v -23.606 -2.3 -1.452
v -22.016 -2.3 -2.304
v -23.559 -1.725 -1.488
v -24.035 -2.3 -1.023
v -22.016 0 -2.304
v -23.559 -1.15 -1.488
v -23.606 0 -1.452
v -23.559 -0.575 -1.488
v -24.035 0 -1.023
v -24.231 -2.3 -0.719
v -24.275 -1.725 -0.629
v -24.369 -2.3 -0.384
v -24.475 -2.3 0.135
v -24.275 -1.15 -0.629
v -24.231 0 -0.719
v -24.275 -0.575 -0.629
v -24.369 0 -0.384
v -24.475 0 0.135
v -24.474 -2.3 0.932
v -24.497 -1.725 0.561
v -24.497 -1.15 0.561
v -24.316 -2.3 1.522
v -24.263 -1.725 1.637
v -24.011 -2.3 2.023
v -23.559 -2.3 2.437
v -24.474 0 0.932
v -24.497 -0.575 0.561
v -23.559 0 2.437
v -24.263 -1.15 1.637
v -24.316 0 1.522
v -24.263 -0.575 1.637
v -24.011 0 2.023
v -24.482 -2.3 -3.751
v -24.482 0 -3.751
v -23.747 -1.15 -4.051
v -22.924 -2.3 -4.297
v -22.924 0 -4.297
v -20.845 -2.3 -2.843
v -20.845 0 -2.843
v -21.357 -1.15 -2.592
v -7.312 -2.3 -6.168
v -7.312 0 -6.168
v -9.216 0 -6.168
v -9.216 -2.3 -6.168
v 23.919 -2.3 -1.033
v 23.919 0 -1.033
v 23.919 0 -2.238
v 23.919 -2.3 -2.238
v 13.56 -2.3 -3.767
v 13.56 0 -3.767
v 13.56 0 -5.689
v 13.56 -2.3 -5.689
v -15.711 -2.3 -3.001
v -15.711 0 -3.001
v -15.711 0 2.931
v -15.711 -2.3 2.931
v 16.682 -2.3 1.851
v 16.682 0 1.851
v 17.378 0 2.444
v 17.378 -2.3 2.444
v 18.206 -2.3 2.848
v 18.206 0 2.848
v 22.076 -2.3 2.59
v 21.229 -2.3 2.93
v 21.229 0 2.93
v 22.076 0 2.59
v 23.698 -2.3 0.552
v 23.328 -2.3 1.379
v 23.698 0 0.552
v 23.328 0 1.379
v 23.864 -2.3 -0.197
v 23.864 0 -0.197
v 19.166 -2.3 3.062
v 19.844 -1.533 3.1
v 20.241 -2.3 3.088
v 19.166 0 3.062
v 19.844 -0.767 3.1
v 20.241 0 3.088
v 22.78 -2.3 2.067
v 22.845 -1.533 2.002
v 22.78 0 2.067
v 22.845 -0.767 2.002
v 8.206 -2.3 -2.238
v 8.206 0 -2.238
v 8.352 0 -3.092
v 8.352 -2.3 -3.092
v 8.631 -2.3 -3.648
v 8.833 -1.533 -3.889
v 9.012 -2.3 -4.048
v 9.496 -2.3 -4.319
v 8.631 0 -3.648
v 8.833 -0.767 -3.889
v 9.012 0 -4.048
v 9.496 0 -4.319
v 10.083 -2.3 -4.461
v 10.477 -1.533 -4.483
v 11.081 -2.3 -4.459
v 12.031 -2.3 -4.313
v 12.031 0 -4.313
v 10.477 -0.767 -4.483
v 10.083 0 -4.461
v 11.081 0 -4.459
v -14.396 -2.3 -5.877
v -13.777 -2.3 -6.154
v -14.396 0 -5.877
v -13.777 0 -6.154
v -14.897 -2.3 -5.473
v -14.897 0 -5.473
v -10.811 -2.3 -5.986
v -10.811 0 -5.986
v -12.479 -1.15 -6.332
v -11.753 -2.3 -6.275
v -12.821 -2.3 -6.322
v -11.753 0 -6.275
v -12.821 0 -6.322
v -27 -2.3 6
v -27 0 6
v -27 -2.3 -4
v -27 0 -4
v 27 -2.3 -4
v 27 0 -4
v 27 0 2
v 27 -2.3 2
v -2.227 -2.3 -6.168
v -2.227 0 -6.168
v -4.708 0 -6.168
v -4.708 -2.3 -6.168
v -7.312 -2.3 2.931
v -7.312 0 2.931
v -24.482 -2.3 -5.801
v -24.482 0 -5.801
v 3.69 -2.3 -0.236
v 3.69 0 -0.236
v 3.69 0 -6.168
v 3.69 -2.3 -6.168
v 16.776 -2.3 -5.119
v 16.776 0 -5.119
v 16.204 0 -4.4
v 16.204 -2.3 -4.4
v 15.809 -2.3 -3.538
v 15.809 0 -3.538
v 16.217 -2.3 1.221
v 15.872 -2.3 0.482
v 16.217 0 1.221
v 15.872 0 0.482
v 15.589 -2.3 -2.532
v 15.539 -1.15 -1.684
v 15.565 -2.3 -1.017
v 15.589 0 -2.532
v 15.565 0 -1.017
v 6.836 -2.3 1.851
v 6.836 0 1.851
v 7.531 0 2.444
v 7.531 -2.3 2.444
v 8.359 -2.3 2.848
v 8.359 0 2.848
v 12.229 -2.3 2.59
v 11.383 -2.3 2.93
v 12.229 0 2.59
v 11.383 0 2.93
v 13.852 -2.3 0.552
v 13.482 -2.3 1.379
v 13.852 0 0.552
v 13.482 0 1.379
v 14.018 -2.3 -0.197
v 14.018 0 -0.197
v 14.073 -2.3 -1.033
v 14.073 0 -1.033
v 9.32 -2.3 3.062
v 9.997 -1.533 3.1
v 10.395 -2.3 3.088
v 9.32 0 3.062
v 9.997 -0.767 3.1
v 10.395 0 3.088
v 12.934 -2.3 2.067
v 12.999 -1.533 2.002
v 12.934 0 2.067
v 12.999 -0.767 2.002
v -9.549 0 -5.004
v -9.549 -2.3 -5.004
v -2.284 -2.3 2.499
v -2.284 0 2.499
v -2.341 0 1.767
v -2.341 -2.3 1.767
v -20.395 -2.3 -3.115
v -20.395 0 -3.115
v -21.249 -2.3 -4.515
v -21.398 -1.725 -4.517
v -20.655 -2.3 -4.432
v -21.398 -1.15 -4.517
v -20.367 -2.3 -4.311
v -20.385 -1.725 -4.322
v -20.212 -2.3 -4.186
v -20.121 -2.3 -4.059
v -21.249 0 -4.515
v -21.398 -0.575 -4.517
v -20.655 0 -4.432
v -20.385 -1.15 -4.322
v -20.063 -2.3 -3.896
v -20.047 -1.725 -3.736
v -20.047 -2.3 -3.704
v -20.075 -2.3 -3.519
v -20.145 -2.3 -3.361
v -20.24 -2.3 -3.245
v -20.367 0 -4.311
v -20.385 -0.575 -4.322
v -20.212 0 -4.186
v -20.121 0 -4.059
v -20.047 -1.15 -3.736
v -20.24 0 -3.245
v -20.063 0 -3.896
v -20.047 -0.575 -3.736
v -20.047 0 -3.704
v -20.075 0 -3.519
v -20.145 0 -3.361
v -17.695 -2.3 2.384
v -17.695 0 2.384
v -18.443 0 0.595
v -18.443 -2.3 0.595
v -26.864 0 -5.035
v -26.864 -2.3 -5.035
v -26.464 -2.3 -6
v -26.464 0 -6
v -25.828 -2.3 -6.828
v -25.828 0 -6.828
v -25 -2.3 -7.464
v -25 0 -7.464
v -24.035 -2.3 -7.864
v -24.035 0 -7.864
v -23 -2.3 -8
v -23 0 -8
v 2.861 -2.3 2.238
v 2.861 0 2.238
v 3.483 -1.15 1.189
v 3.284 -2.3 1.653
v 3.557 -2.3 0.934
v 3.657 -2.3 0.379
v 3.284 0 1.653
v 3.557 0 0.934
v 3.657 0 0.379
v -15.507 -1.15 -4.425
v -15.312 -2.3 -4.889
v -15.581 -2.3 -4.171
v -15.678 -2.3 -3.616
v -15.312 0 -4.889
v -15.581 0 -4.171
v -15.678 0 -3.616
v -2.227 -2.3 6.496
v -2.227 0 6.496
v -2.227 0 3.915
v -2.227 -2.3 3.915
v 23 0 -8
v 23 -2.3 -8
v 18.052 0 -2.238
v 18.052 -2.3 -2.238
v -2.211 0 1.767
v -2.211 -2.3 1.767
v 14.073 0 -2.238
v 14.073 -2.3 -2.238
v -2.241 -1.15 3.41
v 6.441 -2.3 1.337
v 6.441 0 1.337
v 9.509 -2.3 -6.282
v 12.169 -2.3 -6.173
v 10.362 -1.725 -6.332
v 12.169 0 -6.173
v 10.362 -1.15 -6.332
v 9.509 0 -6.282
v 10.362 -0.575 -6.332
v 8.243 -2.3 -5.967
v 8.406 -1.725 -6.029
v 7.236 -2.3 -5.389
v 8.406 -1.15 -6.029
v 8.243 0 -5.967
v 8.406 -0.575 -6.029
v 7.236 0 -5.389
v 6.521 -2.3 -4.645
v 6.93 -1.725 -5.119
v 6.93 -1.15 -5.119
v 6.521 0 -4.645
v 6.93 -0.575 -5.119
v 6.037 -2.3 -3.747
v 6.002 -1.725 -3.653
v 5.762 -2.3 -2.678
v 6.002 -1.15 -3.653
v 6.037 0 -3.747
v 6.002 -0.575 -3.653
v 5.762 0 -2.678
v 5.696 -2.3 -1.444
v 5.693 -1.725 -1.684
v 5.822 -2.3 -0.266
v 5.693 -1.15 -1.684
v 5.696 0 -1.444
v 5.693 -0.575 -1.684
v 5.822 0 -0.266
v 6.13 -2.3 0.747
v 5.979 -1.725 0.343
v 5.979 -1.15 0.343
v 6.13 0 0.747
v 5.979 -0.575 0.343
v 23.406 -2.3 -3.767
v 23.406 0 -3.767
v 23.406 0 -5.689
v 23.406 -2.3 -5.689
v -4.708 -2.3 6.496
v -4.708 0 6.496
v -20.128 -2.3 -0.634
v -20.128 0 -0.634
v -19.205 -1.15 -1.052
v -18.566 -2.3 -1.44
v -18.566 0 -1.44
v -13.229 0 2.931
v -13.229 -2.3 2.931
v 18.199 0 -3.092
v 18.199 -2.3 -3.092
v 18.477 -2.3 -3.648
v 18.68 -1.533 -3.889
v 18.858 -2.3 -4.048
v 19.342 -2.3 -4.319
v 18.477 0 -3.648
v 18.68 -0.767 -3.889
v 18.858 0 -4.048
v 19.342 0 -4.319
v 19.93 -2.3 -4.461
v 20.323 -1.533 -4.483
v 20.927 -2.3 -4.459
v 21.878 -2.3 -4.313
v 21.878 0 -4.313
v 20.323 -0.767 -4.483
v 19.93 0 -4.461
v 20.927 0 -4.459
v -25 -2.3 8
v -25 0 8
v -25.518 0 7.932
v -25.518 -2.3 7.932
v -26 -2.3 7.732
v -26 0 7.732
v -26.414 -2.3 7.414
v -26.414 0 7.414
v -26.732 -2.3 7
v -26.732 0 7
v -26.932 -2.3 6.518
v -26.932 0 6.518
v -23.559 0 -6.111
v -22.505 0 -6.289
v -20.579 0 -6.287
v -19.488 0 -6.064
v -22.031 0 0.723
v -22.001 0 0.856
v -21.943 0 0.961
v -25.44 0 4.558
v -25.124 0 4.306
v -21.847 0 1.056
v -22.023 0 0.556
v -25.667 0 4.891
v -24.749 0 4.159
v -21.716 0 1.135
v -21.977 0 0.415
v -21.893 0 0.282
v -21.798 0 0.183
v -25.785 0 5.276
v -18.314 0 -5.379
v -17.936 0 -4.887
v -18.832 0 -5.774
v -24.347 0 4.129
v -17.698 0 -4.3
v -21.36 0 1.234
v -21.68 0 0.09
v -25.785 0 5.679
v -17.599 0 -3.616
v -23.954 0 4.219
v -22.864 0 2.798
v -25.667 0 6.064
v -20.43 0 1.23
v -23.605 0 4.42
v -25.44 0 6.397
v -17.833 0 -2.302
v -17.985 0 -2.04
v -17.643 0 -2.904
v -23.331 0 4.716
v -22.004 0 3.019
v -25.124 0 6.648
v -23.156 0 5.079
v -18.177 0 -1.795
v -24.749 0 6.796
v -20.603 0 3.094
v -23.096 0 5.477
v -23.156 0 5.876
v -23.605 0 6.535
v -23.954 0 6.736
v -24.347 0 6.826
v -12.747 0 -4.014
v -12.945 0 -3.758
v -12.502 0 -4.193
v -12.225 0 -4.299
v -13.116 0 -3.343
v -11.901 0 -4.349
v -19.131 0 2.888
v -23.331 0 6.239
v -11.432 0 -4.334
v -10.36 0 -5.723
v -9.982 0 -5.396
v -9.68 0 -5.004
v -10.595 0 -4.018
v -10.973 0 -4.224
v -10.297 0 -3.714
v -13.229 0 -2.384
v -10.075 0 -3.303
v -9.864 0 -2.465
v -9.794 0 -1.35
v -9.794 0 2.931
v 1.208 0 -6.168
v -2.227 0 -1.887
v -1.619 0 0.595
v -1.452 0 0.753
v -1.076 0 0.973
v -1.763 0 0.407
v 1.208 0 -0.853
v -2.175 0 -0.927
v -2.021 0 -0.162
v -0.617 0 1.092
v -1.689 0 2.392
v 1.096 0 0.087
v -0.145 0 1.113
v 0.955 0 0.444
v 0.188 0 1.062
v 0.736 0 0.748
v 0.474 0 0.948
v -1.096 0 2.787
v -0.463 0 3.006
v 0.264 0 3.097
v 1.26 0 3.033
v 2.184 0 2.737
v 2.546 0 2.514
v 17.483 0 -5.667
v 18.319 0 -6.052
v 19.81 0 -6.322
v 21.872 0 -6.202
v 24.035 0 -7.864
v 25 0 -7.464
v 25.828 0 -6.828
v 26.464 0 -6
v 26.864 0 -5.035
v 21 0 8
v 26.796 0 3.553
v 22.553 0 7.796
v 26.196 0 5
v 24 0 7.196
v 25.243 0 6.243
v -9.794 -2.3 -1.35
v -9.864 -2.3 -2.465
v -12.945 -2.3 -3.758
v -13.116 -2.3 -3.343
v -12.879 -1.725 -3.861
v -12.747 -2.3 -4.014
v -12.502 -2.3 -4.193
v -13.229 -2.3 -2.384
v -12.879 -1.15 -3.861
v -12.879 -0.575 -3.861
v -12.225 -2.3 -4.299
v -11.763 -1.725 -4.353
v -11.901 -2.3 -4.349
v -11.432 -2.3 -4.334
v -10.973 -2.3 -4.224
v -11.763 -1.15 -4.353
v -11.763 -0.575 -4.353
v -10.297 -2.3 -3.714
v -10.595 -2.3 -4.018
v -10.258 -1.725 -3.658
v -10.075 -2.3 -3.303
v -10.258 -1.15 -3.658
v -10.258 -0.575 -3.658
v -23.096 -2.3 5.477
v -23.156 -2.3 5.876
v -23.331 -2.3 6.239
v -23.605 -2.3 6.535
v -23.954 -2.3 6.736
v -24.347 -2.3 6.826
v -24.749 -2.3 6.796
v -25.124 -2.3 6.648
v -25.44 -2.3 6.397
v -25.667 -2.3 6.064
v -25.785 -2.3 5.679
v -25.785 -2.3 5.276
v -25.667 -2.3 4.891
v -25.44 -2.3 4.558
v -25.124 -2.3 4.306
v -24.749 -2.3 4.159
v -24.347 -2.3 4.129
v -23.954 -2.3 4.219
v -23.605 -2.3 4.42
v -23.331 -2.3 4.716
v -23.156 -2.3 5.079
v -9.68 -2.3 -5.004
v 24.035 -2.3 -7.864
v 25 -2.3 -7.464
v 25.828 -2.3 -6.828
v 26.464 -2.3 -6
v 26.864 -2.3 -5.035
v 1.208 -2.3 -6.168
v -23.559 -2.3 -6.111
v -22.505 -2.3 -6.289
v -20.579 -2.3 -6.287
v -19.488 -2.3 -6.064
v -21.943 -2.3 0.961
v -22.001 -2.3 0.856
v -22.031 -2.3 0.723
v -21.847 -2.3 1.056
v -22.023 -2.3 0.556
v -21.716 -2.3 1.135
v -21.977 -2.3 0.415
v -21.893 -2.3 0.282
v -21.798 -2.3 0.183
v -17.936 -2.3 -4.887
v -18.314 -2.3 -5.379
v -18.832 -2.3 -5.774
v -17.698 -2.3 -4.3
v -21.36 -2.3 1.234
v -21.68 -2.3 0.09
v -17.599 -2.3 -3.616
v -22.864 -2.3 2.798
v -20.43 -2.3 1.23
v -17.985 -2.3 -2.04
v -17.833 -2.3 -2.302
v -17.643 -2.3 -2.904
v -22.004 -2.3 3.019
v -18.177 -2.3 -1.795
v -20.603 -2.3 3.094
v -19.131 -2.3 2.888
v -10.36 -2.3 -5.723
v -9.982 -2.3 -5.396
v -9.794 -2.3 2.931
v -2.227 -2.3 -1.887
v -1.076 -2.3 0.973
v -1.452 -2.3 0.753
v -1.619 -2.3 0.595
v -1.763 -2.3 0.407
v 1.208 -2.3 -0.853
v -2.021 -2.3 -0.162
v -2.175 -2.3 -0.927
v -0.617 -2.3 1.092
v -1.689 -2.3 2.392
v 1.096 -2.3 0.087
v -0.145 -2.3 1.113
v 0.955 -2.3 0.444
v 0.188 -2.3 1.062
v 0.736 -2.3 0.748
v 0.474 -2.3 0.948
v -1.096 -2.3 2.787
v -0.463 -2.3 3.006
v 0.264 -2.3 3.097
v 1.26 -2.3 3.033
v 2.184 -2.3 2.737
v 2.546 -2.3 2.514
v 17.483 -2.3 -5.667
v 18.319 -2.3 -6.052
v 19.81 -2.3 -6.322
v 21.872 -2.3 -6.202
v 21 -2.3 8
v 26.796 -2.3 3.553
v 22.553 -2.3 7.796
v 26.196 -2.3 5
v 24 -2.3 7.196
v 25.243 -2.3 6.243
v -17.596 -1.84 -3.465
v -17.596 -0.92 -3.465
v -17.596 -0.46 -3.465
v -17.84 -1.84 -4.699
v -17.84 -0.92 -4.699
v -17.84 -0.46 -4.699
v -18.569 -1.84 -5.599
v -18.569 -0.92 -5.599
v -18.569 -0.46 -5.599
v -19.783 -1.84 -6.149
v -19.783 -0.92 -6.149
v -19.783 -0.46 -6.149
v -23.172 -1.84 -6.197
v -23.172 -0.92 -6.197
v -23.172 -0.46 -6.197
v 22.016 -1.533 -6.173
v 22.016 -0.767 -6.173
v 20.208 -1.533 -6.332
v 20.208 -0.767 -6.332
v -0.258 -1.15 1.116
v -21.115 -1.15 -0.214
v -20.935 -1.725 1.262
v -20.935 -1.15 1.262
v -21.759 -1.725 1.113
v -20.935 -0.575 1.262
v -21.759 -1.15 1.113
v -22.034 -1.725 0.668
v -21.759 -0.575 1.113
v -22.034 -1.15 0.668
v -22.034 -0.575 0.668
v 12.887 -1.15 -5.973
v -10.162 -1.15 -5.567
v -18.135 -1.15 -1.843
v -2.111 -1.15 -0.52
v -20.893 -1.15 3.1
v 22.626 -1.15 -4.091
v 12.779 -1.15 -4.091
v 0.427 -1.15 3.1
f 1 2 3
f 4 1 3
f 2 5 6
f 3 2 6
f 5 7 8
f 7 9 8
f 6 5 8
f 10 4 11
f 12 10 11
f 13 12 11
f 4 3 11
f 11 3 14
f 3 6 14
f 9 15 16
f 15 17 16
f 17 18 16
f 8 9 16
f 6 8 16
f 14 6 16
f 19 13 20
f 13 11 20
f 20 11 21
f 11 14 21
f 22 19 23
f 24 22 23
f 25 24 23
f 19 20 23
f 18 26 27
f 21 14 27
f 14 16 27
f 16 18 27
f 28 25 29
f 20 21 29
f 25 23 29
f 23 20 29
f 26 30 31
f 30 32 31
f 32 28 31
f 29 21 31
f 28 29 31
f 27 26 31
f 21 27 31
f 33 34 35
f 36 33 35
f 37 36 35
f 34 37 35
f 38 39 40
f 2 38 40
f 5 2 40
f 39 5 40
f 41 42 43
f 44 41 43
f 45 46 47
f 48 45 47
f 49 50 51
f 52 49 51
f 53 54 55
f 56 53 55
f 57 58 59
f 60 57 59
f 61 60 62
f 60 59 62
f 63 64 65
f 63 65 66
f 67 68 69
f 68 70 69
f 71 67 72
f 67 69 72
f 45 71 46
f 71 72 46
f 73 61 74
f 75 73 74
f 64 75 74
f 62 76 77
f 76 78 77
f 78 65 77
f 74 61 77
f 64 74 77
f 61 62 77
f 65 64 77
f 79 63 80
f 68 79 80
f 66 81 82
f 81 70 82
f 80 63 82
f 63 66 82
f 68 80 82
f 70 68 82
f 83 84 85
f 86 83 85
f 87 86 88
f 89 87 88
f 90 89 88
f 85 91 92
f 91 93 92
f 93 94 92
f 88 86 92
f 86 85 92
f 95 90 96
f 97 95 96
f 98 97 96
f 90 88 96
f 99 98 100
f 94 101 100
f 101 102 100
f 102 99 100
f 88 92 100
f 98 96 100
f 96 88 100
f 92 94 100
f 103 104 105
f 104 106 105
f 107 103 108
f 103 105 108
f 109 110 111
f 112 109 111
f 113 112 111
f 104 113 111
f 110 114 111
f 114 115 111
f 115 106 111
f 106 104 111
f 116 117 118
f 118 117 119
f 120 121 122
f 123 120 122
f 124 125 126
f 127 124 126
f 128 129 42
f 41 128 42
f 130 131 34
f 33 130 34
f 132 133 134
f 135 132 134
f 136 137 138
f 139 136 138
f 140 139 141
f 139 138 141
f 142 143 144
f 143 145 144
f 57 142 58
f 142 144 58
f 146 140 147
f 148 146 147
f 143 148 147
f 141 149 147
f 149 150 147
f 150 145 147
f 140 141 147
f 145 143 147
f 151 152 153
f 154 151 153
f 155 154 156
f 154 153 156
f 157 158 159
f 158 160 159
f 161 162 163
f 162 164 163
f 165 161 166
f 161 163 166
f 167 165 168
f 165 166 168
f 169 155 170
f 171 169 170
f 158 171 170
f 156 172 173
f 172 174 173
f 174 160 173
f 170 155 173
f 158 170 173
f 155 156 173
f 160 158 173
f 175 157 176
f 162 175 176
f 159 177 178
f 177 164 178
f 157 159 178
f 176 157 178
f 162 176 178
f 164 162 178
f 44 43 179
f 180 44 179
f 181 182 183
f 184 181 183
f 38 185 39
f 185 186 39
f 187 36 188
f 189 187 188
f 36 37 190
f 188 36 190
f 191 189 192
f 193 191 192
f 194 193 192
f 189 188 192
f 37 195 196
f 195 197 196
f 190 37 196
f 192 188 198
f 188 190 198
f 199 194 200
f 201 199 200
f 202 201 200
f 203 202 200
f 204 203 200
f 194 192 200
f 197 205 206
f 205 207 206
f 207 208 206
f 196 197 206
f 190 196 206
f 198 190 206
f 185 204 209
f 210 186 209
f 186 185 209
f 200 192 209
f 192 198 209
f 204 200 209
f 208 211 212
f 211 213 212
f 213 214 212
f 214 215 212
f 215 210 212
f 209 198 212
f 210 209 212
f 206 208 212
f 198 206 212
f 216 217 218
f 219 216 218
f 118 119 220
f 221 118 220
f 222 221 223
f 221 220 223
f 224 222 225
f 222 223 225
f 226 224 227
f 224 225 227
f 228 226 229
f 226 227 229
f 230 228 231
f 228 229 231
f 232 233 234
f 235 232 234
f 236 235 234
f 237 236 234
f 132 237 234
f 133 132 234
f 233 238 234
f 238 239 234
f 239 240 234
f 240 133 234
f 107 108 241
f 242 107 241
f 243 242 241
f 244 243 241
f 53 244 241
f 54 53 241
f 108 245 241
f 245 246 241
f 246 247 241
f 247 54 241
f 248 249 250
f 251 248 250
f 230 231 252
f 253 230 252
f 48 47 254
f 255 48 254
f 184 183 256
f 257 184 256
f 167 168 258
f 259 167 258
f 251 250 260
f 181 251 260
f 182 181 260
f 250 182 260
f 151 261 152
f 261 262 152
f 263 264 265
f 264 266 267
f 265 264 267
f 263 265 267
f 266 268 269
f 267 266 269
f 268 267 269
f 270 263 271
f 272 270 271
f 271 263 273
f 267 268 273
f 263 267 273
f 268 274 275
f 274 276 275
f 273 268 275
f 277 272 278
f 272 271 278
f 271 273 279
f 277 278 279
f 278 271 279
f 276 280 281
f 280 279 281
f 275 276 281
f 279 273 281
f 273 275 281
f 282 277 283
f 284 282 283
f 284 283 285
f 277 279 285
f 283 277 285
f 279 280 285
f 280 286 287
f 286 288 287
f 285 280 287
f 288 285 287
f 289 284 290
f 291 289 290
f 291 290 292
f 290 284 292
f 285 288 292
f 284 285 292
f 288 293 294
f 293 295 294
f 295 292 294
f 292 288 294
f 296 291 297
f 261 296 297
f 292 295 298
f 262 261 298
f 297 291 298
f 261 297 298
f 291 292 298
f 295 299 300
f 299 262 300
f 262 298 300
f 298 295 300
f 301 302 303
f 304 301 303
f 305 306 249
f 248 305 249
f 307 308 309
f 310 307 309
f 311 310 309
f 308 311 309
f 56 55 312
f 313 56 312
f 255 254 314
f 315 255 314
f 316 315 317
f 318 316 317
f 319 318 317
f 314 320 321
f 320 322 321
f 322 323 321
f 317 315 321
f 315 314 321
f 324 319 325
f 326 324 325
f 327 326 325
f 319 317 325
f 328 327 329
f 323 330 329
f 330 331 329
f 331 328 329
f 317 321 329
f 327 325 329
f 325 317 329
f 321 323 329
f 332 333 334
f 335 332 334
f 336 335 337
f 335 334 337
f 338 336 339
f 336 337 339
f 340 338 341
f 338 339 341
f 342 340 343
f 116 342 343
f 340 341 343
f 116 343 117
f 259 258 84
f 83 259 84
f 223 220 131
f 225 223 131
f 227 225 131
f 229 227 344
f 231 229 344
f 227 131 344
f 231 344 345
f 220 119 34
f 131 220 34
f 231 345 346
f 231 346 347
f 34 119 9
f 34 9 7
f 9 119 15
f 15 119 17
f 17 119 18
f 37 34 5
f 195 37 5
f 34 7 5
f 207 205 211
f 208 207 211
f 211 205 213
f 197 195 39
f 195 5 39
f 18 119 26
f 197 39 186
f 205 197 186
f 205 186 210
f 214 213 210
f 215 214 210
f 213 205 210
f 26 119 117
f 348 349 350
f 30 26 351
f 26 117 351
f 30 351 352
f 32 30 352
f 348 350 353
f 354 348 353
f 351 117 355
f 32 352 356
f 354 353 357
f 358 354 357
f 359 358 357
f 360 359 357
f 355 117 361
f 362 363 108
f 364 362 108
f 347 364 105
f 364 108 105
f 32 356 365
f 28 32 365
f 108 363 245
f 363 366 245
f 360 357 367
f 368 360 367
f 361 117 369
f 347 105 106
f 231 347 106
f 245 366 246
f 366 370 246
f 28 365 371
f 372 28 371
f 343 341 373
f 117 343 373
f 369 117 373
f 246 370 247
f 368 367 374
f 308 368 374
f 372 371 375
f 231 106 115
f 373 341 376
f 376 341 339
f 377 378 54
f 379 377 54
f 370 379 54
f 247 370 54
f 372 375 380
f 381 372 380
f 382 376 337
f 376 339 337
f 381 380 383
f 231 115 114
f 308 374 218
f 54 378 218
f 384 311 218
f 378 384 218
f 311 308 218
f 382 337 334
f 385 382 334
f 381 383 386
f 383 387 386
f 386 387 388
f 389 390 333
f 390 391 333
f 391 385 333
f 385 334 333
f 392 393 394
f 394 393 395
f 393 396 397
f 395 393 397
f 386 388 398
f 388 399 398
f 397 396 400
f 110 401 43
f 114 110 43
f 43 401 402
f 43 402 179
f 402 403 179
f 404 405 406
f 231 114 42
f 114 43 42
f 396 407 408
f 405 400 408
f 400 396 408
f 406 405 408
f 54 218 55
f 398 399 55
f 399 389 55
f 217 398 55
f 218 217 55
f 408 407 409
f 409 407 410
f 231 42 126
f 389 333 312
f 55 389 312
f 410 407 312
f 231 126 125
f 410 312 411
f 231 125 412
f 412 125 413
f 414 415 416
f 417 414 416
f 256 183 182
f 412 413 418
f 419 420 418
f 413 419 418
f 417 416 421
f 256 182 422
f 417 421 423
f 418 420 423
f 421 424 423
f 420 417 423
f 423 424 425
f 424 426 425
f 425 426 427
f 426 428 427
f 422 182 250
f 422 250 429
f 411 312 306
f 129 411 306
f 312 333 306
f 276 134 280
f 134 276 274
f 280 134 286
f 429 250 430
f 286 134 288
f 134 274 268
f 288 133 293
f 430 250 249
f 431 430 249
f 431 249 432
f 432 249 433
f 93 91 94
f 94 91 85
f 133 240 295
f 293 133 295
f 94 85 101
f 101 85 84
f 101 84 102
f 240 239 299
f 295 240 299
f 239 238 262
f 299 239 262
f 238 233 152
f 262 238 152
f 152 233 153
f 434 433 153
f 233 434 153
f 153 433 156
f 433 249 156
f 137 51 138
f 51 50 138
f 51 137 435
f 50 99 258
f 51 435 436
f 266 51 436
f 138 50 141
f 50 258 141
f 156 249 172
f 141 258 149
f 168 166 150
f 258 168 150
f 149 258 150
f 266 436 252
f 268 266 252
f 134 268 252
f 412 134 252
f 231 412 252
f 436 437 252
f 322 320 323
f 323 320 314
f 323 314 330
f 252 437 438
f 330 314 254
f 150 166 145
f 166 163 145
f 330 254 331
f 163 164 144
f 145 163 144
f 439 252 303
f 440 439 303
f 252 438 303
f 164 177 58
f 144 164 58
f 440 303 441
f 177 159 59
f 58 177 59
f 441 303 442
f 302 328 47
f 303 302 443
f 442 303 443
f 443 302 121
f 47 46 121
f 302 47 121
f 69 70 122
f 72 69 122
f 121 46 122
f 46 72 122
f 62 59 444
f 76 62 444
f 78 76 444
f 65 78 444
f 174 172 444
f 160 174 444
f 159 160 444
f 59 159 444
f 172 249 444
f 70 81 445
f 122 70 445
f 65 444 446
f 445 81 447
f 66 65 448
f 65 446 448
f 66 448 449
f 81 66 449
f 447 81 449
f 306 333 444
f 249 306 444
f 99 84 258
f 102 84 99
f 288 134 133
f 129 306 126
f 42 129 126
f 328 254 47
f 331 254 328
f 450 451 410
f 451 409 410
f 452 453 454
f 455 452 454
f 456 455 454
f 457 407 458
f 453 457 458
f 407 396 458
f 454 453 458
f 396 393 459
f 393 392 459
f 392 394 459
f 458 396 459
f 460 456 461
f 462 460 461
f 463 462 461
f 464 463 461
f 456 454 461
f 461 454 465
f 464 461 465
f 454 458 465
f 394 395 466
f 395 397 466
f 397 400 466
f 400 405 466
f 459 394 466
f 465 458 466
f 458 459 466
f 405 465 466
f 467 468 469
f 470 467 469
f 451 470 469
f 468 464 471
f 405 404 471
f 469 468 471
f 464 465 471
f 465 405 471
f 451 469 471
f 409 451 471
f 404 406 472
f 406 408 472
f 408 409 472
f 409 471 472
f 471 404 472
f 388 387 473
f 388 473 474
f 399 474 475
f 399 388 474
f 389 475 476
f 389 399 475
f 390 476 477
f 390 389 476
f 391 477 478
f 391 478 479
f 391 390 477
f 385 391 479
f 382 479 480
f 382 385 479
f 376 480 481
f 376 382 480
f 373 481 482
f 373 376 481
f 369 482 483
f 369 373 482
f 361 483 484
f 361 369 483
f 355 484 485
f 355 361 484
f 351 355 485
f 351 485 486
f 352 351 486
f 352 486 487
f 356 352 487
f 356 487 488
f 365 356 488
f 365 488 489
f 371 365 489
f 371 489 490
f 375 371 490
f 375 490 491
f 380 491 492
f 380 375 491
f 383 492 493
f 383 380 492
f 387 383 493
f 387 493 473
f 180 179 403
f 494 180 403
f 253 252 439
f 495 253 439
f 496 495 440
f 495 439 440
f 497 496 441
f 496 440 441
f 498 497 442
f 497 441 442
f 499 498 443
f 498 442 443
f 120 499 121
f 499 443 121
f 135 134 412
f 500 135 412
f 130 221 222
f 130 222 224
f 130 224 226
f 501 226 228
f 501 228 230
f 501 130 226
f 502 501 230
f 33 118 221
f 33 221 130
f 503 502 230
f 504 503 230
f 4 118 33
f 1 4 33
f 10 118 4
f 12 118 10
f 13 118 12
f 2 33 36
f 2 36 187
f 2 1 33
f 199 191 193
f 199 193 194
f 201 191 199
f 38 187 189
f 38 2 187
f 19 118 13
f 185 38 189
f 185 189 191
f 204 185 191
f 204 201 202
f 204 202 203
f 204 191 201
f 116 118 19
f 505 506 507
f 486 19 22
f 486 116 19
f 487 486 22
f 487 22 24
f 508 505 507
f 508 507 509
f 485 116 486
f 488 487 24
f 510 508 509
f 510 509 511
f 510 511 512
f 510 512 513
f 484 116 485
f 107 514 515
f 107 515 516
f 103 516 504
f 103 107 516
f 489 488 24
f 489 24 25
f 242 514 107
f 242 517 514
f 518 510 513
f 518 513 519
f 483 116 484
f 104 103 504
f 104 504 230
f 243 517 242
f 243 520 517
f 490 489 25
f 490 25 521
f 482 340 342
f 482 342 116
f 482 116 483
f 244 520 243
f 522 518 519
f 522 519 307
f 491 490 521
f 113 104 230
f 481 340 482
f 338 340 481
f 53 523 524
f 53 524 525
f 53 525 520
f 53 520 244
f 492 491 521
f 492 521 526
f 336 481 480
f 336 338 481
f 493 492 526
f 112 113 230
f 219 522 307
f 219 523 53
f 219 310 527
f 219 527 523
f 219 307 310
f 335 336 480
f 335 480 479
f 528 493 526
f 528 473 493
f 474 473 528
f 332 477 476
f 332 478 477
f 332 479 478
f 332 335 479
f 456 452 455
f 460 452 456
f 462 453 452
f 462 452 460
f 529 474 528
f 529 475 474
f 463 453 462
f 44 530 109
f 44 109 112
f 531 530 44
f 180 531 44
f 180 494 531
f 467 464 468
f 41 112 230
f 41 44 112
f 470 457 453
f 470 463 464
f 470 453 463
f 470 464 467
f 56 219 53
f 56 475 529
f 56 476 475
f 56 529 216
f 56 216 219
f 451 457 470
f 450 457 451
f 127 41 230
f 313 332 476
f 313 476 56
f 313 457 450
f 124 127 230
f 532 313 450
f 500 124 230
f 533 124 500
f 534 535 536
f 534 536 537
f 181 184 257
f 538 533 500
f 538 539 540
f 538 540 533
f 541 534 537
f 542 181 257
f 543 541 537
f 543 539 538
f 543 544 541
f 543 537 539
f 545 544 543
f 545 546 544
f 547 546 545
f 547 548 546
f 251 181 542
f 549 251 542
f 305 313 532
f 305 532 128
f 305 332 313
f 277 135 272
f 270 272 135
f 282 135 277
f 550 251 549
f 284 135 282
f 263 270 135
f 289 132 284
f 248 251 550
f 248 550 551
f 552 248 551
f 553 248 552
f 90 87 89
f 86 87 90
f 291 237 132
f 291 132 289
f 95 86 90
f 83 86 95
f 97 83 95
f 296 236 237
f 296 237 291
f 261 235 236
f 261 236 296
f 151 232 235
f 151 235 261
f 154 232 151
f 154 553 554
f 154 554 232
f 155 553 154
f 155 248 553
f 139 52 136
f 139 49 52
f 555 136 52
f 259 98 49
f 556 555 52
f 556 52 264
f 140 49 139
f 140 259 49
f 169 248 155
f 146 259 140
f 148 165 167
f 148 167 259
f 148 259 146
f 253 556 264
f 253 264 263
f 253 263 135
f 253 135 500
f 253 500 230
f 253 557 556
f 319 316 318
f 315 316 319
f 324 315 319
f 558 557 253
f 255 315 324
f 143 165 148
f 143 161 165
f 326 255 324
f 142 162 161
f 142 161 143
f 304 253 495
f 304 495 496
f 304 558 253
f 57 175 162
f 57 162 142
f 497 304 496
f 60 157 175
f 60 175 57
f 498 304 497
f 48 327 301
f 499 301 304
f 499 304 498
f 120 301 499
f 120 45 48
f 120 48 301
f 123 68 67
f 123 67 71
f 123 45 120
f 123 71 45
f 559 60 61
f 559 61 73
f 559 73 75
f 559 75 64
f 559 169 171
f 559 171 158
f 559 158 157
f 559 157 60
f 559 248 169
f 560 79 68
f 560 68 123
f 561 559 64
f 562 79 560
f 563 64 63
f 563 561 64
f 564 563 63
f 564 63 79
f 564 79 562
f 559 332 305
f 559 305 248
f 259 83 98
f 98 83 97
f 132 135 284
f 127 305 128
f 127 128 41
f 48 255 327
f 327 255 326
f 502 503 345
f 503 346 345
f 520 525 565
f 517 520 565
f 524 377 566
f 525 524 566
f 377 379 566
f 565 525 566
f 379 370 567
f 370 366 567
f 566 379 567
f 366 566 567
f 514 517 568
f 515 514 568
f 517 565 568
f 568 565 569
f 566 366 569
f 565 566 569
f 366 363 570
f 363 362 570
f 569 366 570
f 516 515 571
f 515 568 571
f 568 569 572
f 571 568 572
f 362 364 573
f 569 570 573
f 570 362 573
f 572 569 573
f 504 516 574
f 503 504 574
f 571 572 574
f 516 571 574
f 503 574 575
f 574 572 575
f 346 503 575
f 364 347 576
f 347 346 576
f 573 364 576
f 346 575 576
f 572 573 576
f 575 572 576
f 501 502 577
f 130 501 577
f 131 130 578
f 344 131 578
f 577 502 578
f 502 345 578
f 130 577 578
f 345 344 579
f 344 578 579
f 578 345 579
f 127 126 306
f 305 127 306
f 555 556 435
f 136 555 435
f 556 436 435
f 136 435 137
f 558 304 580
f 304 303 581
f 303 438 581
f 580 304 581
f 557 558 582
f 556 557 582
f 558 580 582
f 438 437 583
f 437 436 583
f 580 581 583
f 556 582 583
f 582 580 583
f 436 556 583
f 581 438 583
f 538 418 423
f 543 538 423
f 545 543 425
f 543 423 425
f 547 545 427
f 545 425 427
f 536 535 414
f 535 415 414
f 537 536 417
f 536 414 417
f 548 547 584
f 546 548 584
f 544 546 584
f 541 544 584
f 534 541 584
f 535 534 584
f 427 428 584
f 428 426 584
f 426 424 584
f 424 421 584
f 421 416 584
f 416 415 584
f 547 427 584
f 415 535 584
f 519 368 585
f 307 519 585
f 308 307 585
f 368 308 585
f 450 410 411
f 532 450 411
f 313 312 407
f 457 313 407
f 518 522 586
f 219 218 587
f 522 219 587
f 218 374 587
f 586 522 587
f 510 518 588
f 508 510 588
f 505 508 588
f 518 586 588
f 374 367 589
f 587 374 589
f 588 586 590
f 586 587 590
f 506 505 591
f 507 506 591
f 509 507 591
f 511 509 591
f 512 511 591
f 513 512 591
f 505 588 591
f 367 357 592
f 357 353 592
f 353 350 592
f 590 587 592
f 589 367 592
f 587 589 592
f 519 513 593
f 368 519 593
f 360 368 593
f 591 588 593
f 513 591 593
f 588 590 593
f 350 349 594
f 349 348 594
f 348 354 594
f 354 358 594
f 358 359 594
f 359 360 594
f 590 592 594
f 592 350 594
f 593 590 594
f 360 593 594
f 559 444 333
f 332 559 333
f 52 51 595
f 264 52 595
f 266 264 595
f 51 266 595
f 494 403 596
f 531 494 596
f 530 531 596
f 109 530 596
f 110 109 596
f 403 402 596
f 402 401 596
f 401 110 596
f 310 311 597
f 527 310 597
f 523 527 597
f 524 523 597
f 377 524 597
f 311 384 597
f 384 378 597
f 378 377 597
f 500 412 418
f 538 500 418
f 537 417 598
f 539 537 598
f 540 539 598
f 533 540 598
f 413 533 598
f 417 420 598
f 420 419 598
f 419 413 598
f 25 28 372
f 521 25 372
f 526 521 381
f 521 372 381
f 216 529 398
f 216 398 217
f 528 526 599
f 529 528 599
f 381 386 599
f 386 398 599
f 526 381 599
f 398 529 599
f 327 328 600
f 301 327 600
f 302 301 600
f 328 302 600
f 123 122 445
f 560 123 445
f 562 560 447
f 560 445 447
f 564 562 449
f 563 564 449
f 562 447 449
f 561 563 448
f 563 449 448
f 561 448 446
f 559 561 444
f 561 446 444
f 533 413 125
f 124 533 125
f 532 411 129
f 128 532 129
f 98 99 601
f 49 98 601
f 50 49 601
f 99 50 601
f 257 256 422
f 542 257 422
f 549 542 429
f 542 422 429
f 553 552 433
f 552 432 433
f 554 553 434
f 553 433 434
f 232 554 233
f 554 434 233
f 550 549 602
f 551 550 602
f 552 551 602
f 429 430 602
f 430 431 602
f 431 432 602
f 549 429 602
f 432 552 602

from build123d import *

# Parameters (mm, degrees)
F0_R     = 1.3521453892
F1_DEPTH = 2.3


with BuildPart() as f1:
    # F0 (on Front) → F1 (new body)
    with BuildSketch(Plane.XZ):
        with BuildLine():
            Line((-23, -8), (23, -8))
            ThreePointArc((23, -8), (25.8284271247, -6.8284271247), (27, -4))
            Line((27, -4), (27, 2))
            ThreePointArc((27, 2), (25.2426406871, 6.2426406871), (21, 8))
            Line((21, 8), (-25, 8))
            ThreePointArc((-25, 8), (-26.4142135624, 7.4142135624), (-27, 6))
            Line((-27, 6), (-27, -4))
            ThreePointArc((-27, -4), (-25.8284271247, -6.8284271247), (-23, -8))
        make_face()
        with BuildLine():
            add(Edge.make_bspline(
                [(-17.8333333333, -2.3022460452), (-17.5963541667, -2.7905272952), (-17.5963541667, -3.4650064619)],
                knots=[0, 0, 0, 1, 1, 1], degree=2))
            add(Edge.make_bspline(
                [(-17.5963541667, -3.4650064619), (-17.5963541667, -4.8660481285), (-18.5690104167, -5.5991210452)],
                knots=[0, 0, 0, 1, 1, 1], degree=2))
            add(Edge.make_bspline(
                [(-18.5690104167, -5.5991210452), (-19.5416666667, -6.3321939619), (-21.4791666667, -6.3321939619)],
                knots=[0, 0, 0, 1, 1, 1], degree=2))
            add(Edge.make_bspline(
                [(-21.4791666667, -6.3321939619), (-22.4713541667, -6.3321939619), (-23.171875, -6.1967772952)],
                knots=[0, 0, 0, 1, 1, 1], degree=2))
            add(Edge.make_bspline(
                [(-23.171875, -6.1967772952), (-23.8723958333, -6.0613606285), (-24.4817708333, -5.8009439619)],
                knots=[0, 0, 0, 1, 1, 1], degree=2))
            Line((-24.4817708333, -5.8009439619), (-24.4817708333, -3.7514647952))
            add(Edge.make_bspline(
                [(-24.4817708333, -3.7514647952), (-23.7916666667, -4.0769856285), (-22.9244791667, -4.2970377119)],
                knots=[0, 0, 0, 1, 1, 1], degree=2))
            add(Edge.make_bspline(
                [(-22.9244791667, -4.2970377119), (-22.0572916667, -4.5170897952), (-21.3984375, -4.5170897952)],
                knots=[0, 0, 0, 1, 1, 1], degree=2))
            add(Edge.make_bspline(
                [(-21.3984375, -4.5170897952), (-20.046875, -4.5170897952), (-20.046875, -3.7358397952)],
                knots=[0, 0, 0, 1, 1, 1], degree=2))
            add(Edge.make_bspline(
                [(-20.046875, -3.7358397952), (-20.046875, -3.4415689619), (-20.2265625, -3.2579752119)],
                knots=[0, 0, 0, 1, 1, 1], degree=2))
            add(Edge.make_bspline(
                [(-20.2265625, -3.2579752119), (-20.40625, -3.0743814619), (-20.8450520833, -2.8426106285)],
                knots=[0, 0, 0, 1, 1, 1], degree=2))
            add(Edge.make_bspline(
                [(-20.8450520833, -2.8426106285), (-21.2838541667, -2.6108397952), (-22.015625, -2.3035481285)],
                knots=[0, 0, 0, 1, 1, 1], degree=2))
            add(Edge.make_bspline(
                [(-22.015625, -2.3035481285), (-23.0651041667, -1.8634439619), (-23.55859375, -1.4884439619)],
                knots=[0, 0, 0, 1, 1, 1], degree=2))
            add(Edge.make_bspline(
                [(-23.55859375, -1.4884439619), (-24.0520833333, -1.1134439619), (-24.2747395833, -0.6290689619)],
                knots=[0, 0, 0, 1, 1, 1], degree=2))
            add(Edge.make_bspline(
                [(-24.2747395833, -0.6290689619), (-24.4973958333, -0.1446939619), (-24.4973958333, 0.5610352048)],
                knots=[0, 0, 0, 1, 1, 1], degree=2))
            add(Edge.make_bspline(
                [(-24.4973958333, 0.5610352048), (-24.4973958333, 1.7745768715), (-23.55859375, 2.4373372881)],
                knots=[0, 0, 0, 1, 1, 1], degree=2))
            add(Edge.make_bspline(
                [(-23.55859375, 2.4373372881), (-22.6197916667, 3.1000977048), (-20.8932291667, 3.1000977048)],
                knots=[0, 0, 0, 1, 1, 1], degree=2))
            add(Edge.make_bspline(
                [(-20.8932291667, 3.1000977048), (-19.25, 3.1000977048), (-17.6953125, 2.3839518715)],
                knots=[0, 0, 0, 1, 1, 1], degree=2))
            Line((-17.6953125, 2.3839518715), (-18.4427083333, 0.5948893715))
            add(Edge.make_bspline(
                [(-18.4427083333, 0.5948893715), (-19.1276041667, 0.8865560381), (-19.7213541667, 1.0740560381)],
                knots=[0, 0, 0, 1, 1, 1], degree=2))
            add(Edge.make_bspline(
                [(-19.7213541667, 1.0740560381), (-20.3151041667, 1.2615560381), (-20.9348958333, 1.2615560381)],
                knots=[0, 0, 0, 1, 1, 1], degree=2))
            add(Edge.make_bspline(
                [(-20.9348958333, 1.2615560381), (-22.0338541667, 1.2615560381), (-22.0338541667, 0.6678060381)],
                knots=[0, 0, 0, 1, 1, 1], degree=2))
            add(Edge.make_bspline(
                [(-22.0338541667, 0.6678060381), (-22.0338541667, 0.3344727048), (-21.6796875, 0.0896810381)],
                knots=[0, 0, 0, 1, 1, 1], degree=2))
            add(Edge.make_bspline(
                [(-21.6796875, 0.0896810381), (-21.3255208333, -0.1551106285), (-20.1276041667, -0.6342772952)],
                knots=[0, 0, 0, 1, 1, 1], degree=2))
            add(Edge.make_bspline(
                [(-20.1276041667, -0.6342772952), (-19.0625, -1.0665689619), (-18.56640625, -1.4402668785)],
                knots=[0, 0, 0, 1, 1, 1], degree=2))
            add(Edge.make_bspline(
                [(-18.56640625, -1.4402668785), (-18.0703125, -1.8139647952), (-17.8333333333, -2.3022460452)],
                knots=[0, 0, 0, 1, 1, 1], degree=2))
        make_face(mode=Mode.SUBTRACT)
        with BuildLine():
            Line((-7.3125, -6.1681314619), (-9.2161458333, -6.1681314619))
            Line((-9.2161458333, -6.1681314619), (-9.5494791667, -5.0040689619))
            Line((-9.5494791667, -5.0040689619), (-9.6796875, -5.0040689619))
            add(Edge.make_bspline(
                [(-9.6796875, -5.0040689619), (-10.078125, -5.6394856285), (-10.8111979167, -5.9858397952)],
                knots=[0, 0, 0, 1, 1, 1], degree=2))
            add(Edge.make_bspline(
                [(-10.8111979167, -5.9858397952), (-11.5442708333, -6.3321939619), (-12.4791666667, -6.3321939619)],
                knots=[0, 0, 0, 1, 1, 1], degree=2))
            add(Edge.make_bspline(
                [(-12.4791666667, -6.3321939619), (-14.0833333333, -6.3321939619), (-14.8971354167, -5.4728189619)],
                knots=[0, 0, 0, 1, 1, 1], degree=2))
            add(Edge.make_bspline(
                [(-14.8971354167, -5.4728189619), (-15.7109375, -4.6134439619), (-15.7109375, -3.0014647952)],
                knots=[0, 0, 0, 1, 1, 1], degree=2))
            Line((-15.7109375, -3.0014647952), (-15.7109375, 2.9308268715))
            Line((-15.7109375, 2.9308268715), (-13.2291666667, 2.9308268715))
            Line((-13.2291666667, 2.9308268715), (-13.2291666667, -2.3842772952))
            add(Edge.make_bspline(
                [(-13.2291666667, -2.3842772952), (-13.2291666667, -3.3686522952), (-12.87890625, -3.8608397952)],
                knots=[0, 0, 0, 1, 1, 1], degree=2))
            add(Edge.make_bspline(
                [(-12.87890625, -3.8608397952), (-12.5286458333, -4.3530272952), (-11.7630208333, -4.3530272952)],
                knots=[0, 0, 0, 1, 1, 1], degree=2))
            add(Edge.make_bspline(
                [(-11.7630208333, -4.3530272952), (-10.7213541667, -4.3530272952), (-10.2578125, -3.6577147952)],
                knots=[0, 0, 0, 1, 1, 1], degree=2))
            add(Edge.make_bspline(
                [(-10.2578125, -3.6577147952), (-9.7942708333, -2.9624022952), (-9.7942708333, -1.3504231285)],
                knots=[0, 0, 0, 1, 1, 1], degree=2))
            Line((-9.7942708333, -1.3504231285), (-9.7942708333, 2.9308268715))
            Line((-9.7942708333, 2.9308268715), (-7.3125, 2.9308268715))
            Line((-7.3125, 2.9308268715), (-7.3125, -6.1681314619))
        make_face(mode=Mode.SUBTRACT)
        with BuildLine():
            add(Edge.make_bspline(
                [(12.1692708333, -6.1733397952), (11.4296875, -6.3321939619), (10.3619791667, -6.3321939619)],
                knots=[0, 0, 0, 1, 1, 1], degree=2))
            add(Edge.make_bspline(
                [(10.3619791667, -6.3321939619), (8.1666666667, -6.3321939619), (6.9296875, -5.1186522952)],
                knots=[0, 0, 0, 1, 1, 1], degree=2))
            add(Edge.make_bspline(
                [(6.9296875, -5.1186522952), (5.6927083333, -3.9051106285), (5.6927083333, -1.6837564619)],
                knots=[0, 0, 0, 1, 1, 1], degree=2))
            add(Edge.make_bspline(
                [(5.6927083333, -1.6837564619), (5.6927083333, 0.6027018715), (6.8359375, 1.8513997881)],
                knots=[0, 0, 0, 1, 1, 1], degree=2))
            add(Edge.make_bspline(
                [(6.8359375, 1.8513997881), (7.9791666667, 3.1000977048), (9.9973958333, 3.1000977048)],
                knots=[0, 0, 0, 1, 1, 1], degree=2))
            add(Edge.make_bspline(
                [(9.9973958333, 3.1000977048), (11.9244791667, 3.1000977048), (12.9986979167, 2.0024414548)],
                knots=[0, 0, 0, 1, 1, 1], degree=2))
            add(Edge.make_bspline(
                [(12.9986979167, 2.0024414548), (14.0729166667, 0.9047852048), (14.0729166667, -1.0327147952)],
                knots=[0, 0, 0, 1, 1, 1], degree=2))
            Line((14.0729166667, -1.0327147952), (14.0729166667, -2.2384439619))
            Line((14.0729166667, -2.2384439619), (8.2057291667, -2.2384439619))
            add(Edge.make_bspline(
                [(8.2057291667, -2.2384439619), (8.2473958333, -3.2957356285), (8.8333333333, -3.8894856285)],
                knots=[0, 0, 0, 1, 1, 1], degree=2))
            add(Edge.make_bspline(
                [(8.8333333333, -3.8894856285), (9.4192708333, -4.4832356285), (10.4765625, -4.4832356285)],
                knots=[0, 0, 0, 1, 1, 1], degree=2))
            add(Edge.make_bspline(
                [(10.4765625, -4.4832356285), (11.2994791667, -4.4832356285), (12.03125, -4.3126627119)],
                knots=[0, 0, 0, 1, 1, 1], degree=2))
            add(Edge.make_bspline(
                [(12.03125, -4.3126627119), (12.7630208333, -4.1420897952), (13.5598958333, -3.7670897952)],
                knots=[0, 0, 0, 1, 1, 1], degree=2))
            Line((13.5598958333, -3.7670897952), (13.5598958333, -5.6889647952))
            add(Edge.make_bspline(
                [(13.5598958333, -5.6889647952), (12.9088541667, -6.0144856285), (12.1692708333, -6.1733397952)],
                knots=[0, 0, 0, 1, 1, 1], degree=2))
        make_face(mode=Mode.SUBTRACT)
        with BuildLine():
            add(Edge.make_bspline(
                [(22.015625, -6.1733397952), (21.2760416667, -6.3321939619), (20.2083333333, -6.3321939619)],
                knots=[0, 0, 0, 1, 1, 1], degree=2))
            add(Edge.make_bspline(
                [(20.2083333333, -6.3321939619), (18.0130208333, -6.3321939619), (16.7760416667, -5.1186522952)],
                knots=[0, 0, 0, 1, 1, 1], degree=2))
            add(Edge.make_bspline(
                [(16.7760416667, -5.1186522952), (15.5390625, -3.9051106285), (15.5390625, -1.6837564619)],
                knots=[0, 0, 0, 1, 1, 1], degree=2))
            add(Edge.make_bspline(
                [(15.5390625, -1.6837564619), (15.5390625, 0.6027018715), (16.6822916667, 1.8513997881)],
                knots=[0, 0, 0, 1, 1, 1], degree=2))
            add(Edge.make_bspline(
                [(16.6822916667, 1.8513997881), (17.8255208333, 3.1000977048), (19.84375, 3.1000977048)],
                knots=[0, 0, 0, 1, 1, 1], degree=2))
            add(Edge.make_bspline(
                [(19.84375, 3.1000977048), (21.7708333333, 3.1000977048), (22.8450520833, 2.0024414548)],
                knots=[0, 0, 0, 1, 1, 1], degree=2))
            add(Edge.make_bspline(
                [(22.8450520833, 2.0024414548), (23.9192708333, 0.9047852048), (23.9192708333, -1.0327147952)],
                knots=[0, 0, 0, 1, 1, 1], degree=2))
            Line((23.9192708333, -1.0327147952), (23.9192708333, -2.2384439619))
            Line((23.9192708333, -2.2384439619), (18.0520833333, -2.2384439619))
            add(Edge.make_bspline(
                [(18.0520833333, -2.2384439619), (18.09375, -3.2957356285), (18.6796875, -3.8894856285)],
                knots=[0, 0, 0, 1, 1, 1], degree=2))
            add(Edge.make_bspline(
                [(18.6796875, -3.8894856285), (19.265625, -4.4832356285), (20.3229166667, -4.4832356285)],
                knots=[0, 0, 0, 1, 1, 1], degree=2))
            add(Edge.make_bspline(
                [(20.3229166667, -4.4832356285), (21.1458333333, -4.4832356285), (21.8776041667, -4.3126627119)],
                knots=[0, 0, 0, 1, 1, 1], degree=2))
            add(Edge.make_bspline(
                [(21.8776041667, -4.3126627119), (22.609375, -4.1420897952), (23.40625, -3.7670897952)],
                knots=[0, 0, 0, 1, 1, 1], degree=2))
            Line((23.40625, -3.7670897952), (23.40625, -5.6889647952))
            add(Edge.make_bspline(
                [(23.40625, -5.6889647952), (22.7552083333, -6.0144856285), (22.015625, -6.1733397952)],
                knots=[0, 0, 0, 1, 1, 1], degree=2))
        make_face(mode=Mode.SUBTRACT)
        with BuildLine():
            Line((3.6901041667, -0.2358397952), (3.6901041667, -6.1681314619))
            Line((3.6901041667, -6.1681314619), (1.2083333333, -6.1681314619))
            Line((1.2083333333, -6.1681314619), (1.2083333333, -0.8530272952))
            add(Edge.make_bspline(
                [(1.2083333333, -0.8530272952), (1.2083333333, 1.1157227048), (-0.2578125, 1.1157227048)],
                knots=[0, 0, 0, 1, 1, 1], degree=2))
            add(Edge.make_bspline(
                [(-0.2578125, 1.1157227048), (-1.2994791667, 1.1157227048), (-1.7630208333, 0.4073893715)],
                knots=[0, 0, 0, 1, 1, 1], degree=2))
            add(Edge.make_bspline(
                [(-1.7630208333, 0.4073893715), (-2.2265625, -0.3009439619), (-2.2265625, -1.8868814619)],
                knots=[0, 0, 0, 1, 1, 1], degree=2))
            Line((-2.2265625, -1.8868814619), (-2.2265625, -6.1681314619))
            Line((-2.2265625, -6.1681314619), (-4.7083333333, -6.1681314619))
            Line((-4.7083333333, -6.1681314619), (-4.7083333333, 6.4959310381))
            Line((-4.7083333333, 6.4959310381), (-2.2265625, 6.4959310381))
            Line((-2.2265625, 6.4959310381), (-2.2265625, 3.9152018715))
            add(Edge.make_bspline(
                [(-2.2265625, 3.9152018715), (-2.2265625, 3.6131185381), (-2.2838541667, 2.4985352048)],
                knots=[0, 0, 0, 1, 1, 1], degree=2))
            Line((-2.2838541667, 2.4985352048), (-2.3411458333, 1.7667643715))
            Line((-2.3411458333, 1.7667643715), (-2.2109375, 1.7667643715))
            add(Edge.make_bspline(
                [(-2.2109375, 1.7667643715), (-1.3802083333, 3.1000977048), (0.4270833333, 3.1000977048)],
                knots=[0, 0, 0, 1, 1, 1], degree=2))
            add(Edge.make_bspline(
                [(0.4270833333, 3.1000977048), (2.03125, 3.1000977048), (2.8606770833, 2.2381185381)],
                knots=[0, 0, 0, 1, 1, 1], degree=2))
            add(Edge.make_bspline(
                [(2.8606770833, 2.2381185381), (3.6901041667, 1.3761393715), (3.6901041667, -0.2358397952)],
                knots=[0, 0, 0, 1, 1, 1], degree=2))
        make_face(mode=Mode.SUBTRACT)
        with Locations((-24.4483277202, 5.4773832671)):
            Circle(F0_R, mode=Mode.SUBTRACT)
    extrude(amount=F1_DEPTH)


solid = f1.part
